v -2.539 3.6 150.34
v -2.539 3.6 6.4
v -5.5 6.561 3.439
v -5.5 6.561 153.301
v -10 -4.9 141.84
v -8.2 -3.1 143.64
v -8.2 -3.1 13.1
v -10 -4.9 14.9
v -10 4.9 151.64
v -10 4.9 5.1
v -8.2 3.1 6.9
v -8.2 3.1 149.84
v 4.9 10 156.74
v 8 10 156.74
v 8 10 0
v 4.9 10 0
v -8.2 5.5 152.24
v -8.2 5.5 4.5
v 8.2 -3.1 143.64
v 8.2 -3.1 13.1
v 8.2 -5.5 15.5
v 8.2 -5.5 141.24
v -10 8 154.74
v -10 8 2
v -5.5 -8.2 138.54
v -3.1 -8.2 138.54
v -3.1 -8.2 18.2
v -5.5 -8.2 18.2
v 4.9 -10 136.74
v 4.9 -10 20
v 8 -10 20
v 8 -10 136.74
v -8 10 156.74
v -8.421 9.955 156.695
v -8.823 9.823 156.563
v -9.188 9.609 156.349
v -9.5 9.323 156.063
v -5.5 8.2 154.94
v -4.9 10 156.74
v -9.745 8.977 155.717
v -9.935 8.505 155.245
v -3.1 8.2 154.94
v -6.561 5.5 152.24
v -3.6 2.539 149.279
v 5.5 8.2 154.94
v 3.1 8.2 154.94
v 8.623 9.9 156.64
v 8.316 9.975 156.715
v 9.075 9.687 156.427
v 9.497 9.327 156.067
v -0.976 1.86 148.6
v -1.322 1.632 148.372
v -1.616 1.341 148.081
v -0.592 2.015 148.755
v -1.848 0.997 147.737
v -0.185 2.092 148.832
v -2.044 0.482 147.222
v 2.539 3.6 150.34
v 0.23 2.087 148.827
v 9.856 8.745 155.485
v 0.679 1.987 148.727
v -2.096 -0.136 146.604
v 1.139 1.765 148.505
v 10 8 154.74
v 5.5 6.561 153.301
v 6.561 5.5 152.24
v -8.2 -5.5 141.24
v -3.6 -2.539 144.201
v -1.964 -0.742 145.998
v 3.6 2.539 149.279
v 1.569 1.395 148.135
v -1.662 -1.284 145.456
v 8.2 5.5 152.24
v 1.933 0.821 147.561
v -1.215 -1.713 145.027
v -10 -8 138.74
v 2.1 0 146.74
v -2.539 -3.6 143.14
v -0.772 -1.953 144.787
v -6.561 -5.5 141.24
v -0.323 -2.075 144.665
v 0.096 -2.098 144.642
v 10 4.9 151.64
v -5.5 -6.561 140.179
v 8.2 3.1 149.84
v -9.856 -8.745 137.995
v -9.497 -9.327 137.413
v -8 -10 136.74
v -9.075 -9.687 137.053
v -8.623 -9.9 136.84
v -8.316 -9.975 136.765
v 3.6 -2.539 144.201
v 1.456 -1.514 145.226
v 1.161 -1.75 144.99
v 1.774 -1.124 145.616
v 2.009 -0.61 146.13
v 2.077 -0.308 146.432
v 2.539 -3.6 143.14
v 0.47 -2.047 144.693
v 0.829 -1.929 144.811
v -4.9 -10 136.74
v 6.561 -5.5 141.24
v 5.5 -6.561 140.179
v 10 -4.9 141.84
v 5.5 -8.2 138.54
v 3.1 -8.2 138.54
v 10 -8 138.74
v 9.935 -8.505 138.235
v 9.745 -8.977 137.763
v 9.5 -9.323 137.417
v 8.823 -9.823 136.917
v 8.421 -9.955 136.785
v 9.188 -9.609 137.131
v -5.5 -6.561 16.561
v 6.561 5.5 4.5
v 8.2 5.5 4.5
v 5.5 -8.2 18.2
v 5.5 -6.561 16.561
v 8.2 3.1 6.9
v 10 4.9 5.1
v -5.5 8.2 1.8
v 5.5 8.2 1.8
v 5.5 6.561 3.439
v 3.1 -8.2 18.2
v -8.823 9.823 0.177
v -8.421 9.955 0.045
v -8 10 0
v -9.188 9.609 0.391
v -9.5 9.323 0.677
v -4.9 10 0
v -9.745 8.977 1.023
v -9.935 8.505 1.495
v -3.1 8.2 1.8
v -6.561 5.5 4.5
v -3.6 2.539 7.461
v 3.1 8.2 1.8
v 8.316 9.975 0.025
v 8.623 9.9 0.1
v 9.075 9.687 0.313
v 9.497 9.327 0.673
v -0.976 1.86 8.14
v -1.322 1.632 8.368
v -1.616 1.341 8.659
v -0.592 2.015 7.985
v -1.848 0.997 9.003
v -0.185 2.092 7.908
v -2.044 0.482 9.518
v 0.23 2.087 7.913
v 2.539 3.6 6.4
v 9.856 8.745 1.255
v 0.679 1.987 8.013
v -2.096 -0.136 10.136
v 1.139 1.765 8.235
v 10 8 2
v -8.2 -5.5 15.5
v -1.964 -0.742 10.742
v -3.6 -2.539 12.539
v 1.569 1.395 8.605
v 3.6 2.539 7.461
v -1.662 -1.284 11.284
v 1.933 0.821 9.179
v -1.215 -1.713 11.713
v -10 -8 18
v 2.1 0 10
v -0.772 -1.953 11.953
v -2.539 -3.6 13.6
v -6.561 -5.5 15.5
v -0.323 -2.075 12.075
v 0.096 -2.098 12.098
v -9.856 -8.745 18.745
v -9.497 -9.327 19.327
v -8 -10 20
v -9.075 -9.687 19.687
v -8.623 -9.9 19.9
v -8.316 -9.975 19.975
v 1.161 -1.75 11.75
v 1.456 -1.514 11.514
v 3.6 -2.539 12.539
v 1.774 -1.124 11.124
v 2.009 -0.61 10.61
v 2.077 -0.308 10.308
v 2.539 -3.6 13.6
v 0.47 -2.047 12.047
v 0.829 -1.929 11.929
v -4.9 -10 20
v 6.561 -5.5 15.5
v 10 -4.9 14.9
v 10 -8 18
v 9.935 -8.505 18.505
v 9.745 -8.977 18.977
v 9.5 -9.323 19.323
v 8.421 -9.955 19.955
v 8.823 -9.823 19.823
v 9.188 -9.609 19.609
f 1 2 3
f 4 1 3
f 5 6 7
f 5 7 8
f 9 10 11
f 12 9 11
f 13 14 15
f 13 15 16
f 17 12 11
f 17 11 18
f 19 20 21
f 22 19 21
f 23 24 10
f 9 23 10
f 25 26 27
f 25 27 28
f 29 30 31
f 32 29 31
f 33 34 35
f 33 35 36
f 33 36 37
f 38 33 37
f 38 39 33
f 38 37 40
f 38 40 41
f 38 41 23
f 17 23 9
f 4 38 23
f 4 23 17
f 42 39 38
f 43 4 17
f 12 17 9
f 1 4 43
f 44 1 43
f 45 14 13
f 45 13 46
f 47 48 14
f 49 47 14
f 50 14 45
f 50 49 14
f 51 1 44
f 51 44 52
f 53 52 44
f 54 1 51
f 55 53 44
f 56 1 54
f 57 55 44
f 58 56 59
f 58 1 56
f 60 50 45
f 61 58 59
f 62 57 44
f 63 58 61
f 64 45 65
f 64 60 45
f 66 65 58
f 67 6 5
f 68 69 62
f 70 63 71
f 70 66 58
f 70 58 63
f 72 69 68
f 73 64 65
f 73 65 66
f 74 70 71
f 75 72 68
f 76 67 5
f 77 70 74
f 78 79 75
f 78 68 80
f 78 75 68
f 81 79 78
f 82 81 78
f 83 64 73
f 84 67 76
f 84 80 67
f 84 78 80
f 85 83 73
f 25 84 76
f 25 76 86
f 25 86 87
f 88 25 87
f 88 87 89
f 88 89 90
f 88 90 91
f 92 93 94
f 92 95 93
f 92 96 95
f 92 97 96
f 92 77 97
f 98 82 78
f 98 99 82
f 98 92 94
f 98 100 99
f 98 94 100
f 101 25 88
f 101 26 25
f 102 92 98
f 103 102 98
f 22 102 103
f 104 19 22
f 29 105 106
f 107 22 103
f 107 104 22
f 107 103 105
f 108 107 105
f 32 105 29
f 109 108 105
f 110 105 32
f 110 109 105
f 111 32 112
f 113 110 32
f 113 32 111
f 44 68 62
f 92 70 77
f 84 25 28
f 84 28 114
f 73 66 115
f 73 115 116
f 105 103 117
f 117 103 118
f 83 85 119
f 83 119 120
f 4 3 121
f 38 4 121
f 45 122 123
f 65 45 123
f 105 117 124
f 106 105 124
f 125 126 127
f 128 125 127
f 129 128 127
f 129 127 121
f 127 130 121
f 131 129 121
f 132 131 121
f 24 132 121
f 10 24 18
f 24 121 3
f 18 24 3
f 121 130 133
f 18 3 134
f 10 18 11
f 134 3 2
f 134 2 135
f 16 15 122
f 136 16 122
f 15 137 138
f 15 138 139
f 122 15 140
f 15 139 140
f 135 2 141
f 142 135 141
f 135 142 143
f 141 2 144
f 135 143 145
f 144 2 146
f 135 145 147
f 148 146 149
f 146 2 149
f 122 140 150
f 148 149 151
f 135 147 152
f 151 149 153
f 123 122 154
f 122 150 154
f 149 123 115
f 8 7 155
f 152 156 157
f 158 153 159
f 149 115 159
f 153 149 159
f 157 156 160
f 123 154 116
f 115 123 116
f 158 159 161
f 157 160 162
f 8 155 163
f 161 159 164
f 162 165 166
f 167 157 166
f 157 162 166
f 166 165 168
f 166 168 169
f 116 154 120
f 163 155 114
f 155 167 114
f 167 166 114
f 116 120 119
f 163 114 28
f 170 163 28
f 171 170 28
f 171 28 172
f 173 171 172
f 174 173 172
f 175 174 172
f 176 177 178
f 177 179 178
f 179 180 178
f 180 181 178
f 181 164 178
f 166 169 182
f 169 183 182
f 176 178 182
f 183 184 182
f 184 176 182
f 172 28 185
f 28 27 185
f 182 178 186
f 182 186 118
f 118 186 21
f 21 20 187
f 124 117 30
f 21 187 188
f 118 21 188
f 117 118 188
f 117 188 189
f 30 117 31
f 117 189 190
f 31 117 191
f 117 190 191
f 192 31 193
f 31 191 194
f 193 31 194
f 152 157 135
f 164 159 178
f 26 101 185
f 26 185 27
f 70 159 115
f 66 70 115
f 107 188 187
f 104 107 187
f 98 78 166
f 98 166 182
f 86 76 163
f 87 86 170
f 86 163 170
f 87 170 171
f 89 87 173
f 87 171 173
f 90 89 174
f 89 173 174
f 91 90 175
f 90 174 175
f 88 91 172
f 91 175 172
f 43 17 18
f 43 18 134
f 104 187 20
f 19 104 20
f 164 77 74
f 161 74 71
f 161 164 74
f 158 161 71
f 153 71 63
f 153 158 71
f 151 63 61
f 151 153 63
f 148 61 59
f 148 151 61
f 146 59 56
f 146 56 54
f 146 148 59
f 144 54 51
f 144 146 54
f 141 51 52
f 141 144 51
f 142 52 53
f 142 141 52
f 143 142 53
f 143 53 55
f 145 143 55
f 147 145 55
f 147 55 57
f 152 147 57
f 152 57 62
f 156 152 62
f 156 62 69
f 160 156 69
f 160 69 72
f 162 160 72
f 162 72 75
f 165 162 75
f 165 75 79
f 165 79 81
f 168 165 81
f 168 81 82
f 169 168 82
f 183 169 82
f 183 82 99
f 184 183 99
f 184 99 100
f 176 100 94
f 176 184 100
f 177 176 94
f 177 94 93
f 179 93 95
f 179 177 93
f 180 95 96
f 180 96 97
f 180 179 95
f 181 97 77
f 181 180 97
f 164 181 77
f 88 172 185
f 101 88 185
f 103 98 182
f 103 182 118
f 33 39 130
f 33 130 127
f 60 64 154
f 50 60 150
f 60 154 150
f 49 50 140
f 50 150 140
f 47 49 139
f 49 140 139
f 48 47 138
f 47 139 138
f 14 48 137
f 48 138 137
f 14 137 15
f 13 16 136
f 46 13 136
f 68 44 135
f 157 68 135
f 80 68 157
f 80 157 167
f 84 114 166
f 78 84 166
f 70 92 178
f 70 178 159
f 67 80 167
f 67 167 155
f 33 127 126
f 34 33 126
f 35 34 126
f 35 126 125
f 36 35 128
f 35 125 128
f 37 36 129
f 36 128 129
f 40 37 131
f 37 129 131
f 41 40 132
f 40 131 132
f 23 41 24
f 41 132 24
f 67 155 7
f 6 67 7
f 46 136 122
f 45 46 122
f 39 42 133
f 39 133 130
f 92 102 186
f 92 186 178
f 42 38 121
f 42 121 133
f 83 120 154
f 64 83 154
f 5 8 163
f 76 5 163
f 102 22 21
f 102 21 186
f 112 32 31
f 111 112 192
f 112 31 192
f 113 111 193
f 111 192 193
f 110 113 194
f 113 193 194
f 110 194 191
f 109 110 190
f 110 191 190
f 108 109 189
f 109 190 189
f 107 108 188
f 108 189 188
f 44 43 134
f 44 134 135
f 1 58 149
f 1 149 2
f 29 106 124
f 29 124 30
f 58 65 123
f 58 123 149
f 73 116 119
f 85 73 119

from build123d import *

# Parameters (mm, degrees)
SKETCH1_R           = 2.1
BOSS_EXTRUDE1_DEPTH = 156.74
CUT_EXTRUDE1_DEPTH  = 159.326964223


with BuildPart() as part:
    # Sketch1 → Boss-Extrude1 (new body)
    with BuildSketch(Plane.XY):
        with BuildLine():
            Line((-4.9, -10), (-3.1, -8.2))
            Line((-3.1, -8.2), (-5.5, -8.2))
            Line((-5.5, -8.2), (-5.5, -6.560660172))
            Line((-5.5, -6.560660172), (-2.539339828, -3.6))
            Line((-2.539339828, -3.6), (2.539339828, -3.6))
            Line((2.539339828, -3.6), (5.5, -6.560660172))
            Line((5.5, -6.560660172), (5.5, -8.2))
            Line((5.5, -8.2), (3.1, -8.2))
            Line((3.1, -8.2), (4.9, -10))
            Line((4.9, -10), (8, -10))
            ThreePointArc((8, -10), (9.414213562, -9.414213562), (10, -8))
            Line((10, -8), (10, -4.9))
            Line((10, -4.9), (8.2, -3.1))
            Line((8.2, -3.1), (8.2, -5.5))
            Line((8.2, -5.5), (6.560660172, -5.5))
            Line((6.560660172, -5.5), (3.6, -2.539339828))
            Line((3.6, -2.539339828), (3.6, 2.539339828))
            Line((3.6, 2.539339828), (6.560660172, 5.5))
            Line((6.560660172, 5.5), (8.2, 5.5))
            Line((8.2, 5.5), (8.2, 3.1))
            Line((8.2, 3.1), (10, 4.9))
            Line((10, 4.9), (10, 8))
            ThreePointArc((10, 8), (9.414213562, 9.414213562), (8, 10))
            Line((8, 10), (4.9, 10))
            Line((4.9, 10), (3.1, 8.2))
            Line((3.1, 8.2), (5.5, 8.2))
            Line((5.5, 8.2), (5.5, 6.560660172))
            Line((5.5, 6.560660172), (2.539339828, 3.6))
            Line((2.539339828, 3.6), (-2.539339828, 3.6))
            Line((-2.539339828, 3.6), (-5.5, 6.560660172))
            Line((-5.5, 6.560660172), (-5.5, 8.2))
            Line((-5.5, 8.2), (-3.1, 8.2))
            Line((-3.1, 8.2), (-4.9, 10))
            Line((-4.9, 10), (-8, 10))
            ThreePointArc((-8, 10), (-9.414213562, 9.414213562), (-10, 8))
            Line((-10, 8), (-10, 4.9))
            Line((-10, 4.9), (-8.2, 3.1))
            Line((-8.2, 3.1), (-8.2, 5.5))
            Line((-8.2, 5.5), (-6.560660172, 5.5))
            Line((-6.560660172, 5.5), (-3.6, 2.539339828))
            Line((-3.6, 2.539339828), (-3.6, -2.539339828))
            Line((-3.6, -2.539339828), (-6.560660172, -5.5))
            Line((-6.560660172, -5.5), (-8.2, -5.5))
            Line((-8.2, -5.5), (-8.2, -3.1))
            Line((-8.2, -3.1), (-10, -4.9))
            Line((-10, -4.9), (-10, -8))
            ThreePointArc((-10, -8), (-9.414213562, -9.414213562), (-8, -10))
            Line((-8, -10), (-4.9, -10))
        make_face()
        Circle(SKETCH1_R, mode=Mode.SUBTRACT)
    extrude(amount=BOSS_EXTRUDE1_DEPTH)

    # Sketch2 → Cut-Extrude1 (cut, through all)
    with BuildSketch(Plane(origin=(10, 0, 0), x_dir=(0, 0, -1), z_dir=(1, 0, 0))):
        Polygon((-156.74, 10), (-136.74, -10), (-156.74, -10), align=None)
        Polygon((0, 10), (-20, -10), (0, -10), align=None)
    extrude(amount=-CUT_EXTRUDE1_DEPTH, mode=Mode.SUBTRACT)


solid = part.part
